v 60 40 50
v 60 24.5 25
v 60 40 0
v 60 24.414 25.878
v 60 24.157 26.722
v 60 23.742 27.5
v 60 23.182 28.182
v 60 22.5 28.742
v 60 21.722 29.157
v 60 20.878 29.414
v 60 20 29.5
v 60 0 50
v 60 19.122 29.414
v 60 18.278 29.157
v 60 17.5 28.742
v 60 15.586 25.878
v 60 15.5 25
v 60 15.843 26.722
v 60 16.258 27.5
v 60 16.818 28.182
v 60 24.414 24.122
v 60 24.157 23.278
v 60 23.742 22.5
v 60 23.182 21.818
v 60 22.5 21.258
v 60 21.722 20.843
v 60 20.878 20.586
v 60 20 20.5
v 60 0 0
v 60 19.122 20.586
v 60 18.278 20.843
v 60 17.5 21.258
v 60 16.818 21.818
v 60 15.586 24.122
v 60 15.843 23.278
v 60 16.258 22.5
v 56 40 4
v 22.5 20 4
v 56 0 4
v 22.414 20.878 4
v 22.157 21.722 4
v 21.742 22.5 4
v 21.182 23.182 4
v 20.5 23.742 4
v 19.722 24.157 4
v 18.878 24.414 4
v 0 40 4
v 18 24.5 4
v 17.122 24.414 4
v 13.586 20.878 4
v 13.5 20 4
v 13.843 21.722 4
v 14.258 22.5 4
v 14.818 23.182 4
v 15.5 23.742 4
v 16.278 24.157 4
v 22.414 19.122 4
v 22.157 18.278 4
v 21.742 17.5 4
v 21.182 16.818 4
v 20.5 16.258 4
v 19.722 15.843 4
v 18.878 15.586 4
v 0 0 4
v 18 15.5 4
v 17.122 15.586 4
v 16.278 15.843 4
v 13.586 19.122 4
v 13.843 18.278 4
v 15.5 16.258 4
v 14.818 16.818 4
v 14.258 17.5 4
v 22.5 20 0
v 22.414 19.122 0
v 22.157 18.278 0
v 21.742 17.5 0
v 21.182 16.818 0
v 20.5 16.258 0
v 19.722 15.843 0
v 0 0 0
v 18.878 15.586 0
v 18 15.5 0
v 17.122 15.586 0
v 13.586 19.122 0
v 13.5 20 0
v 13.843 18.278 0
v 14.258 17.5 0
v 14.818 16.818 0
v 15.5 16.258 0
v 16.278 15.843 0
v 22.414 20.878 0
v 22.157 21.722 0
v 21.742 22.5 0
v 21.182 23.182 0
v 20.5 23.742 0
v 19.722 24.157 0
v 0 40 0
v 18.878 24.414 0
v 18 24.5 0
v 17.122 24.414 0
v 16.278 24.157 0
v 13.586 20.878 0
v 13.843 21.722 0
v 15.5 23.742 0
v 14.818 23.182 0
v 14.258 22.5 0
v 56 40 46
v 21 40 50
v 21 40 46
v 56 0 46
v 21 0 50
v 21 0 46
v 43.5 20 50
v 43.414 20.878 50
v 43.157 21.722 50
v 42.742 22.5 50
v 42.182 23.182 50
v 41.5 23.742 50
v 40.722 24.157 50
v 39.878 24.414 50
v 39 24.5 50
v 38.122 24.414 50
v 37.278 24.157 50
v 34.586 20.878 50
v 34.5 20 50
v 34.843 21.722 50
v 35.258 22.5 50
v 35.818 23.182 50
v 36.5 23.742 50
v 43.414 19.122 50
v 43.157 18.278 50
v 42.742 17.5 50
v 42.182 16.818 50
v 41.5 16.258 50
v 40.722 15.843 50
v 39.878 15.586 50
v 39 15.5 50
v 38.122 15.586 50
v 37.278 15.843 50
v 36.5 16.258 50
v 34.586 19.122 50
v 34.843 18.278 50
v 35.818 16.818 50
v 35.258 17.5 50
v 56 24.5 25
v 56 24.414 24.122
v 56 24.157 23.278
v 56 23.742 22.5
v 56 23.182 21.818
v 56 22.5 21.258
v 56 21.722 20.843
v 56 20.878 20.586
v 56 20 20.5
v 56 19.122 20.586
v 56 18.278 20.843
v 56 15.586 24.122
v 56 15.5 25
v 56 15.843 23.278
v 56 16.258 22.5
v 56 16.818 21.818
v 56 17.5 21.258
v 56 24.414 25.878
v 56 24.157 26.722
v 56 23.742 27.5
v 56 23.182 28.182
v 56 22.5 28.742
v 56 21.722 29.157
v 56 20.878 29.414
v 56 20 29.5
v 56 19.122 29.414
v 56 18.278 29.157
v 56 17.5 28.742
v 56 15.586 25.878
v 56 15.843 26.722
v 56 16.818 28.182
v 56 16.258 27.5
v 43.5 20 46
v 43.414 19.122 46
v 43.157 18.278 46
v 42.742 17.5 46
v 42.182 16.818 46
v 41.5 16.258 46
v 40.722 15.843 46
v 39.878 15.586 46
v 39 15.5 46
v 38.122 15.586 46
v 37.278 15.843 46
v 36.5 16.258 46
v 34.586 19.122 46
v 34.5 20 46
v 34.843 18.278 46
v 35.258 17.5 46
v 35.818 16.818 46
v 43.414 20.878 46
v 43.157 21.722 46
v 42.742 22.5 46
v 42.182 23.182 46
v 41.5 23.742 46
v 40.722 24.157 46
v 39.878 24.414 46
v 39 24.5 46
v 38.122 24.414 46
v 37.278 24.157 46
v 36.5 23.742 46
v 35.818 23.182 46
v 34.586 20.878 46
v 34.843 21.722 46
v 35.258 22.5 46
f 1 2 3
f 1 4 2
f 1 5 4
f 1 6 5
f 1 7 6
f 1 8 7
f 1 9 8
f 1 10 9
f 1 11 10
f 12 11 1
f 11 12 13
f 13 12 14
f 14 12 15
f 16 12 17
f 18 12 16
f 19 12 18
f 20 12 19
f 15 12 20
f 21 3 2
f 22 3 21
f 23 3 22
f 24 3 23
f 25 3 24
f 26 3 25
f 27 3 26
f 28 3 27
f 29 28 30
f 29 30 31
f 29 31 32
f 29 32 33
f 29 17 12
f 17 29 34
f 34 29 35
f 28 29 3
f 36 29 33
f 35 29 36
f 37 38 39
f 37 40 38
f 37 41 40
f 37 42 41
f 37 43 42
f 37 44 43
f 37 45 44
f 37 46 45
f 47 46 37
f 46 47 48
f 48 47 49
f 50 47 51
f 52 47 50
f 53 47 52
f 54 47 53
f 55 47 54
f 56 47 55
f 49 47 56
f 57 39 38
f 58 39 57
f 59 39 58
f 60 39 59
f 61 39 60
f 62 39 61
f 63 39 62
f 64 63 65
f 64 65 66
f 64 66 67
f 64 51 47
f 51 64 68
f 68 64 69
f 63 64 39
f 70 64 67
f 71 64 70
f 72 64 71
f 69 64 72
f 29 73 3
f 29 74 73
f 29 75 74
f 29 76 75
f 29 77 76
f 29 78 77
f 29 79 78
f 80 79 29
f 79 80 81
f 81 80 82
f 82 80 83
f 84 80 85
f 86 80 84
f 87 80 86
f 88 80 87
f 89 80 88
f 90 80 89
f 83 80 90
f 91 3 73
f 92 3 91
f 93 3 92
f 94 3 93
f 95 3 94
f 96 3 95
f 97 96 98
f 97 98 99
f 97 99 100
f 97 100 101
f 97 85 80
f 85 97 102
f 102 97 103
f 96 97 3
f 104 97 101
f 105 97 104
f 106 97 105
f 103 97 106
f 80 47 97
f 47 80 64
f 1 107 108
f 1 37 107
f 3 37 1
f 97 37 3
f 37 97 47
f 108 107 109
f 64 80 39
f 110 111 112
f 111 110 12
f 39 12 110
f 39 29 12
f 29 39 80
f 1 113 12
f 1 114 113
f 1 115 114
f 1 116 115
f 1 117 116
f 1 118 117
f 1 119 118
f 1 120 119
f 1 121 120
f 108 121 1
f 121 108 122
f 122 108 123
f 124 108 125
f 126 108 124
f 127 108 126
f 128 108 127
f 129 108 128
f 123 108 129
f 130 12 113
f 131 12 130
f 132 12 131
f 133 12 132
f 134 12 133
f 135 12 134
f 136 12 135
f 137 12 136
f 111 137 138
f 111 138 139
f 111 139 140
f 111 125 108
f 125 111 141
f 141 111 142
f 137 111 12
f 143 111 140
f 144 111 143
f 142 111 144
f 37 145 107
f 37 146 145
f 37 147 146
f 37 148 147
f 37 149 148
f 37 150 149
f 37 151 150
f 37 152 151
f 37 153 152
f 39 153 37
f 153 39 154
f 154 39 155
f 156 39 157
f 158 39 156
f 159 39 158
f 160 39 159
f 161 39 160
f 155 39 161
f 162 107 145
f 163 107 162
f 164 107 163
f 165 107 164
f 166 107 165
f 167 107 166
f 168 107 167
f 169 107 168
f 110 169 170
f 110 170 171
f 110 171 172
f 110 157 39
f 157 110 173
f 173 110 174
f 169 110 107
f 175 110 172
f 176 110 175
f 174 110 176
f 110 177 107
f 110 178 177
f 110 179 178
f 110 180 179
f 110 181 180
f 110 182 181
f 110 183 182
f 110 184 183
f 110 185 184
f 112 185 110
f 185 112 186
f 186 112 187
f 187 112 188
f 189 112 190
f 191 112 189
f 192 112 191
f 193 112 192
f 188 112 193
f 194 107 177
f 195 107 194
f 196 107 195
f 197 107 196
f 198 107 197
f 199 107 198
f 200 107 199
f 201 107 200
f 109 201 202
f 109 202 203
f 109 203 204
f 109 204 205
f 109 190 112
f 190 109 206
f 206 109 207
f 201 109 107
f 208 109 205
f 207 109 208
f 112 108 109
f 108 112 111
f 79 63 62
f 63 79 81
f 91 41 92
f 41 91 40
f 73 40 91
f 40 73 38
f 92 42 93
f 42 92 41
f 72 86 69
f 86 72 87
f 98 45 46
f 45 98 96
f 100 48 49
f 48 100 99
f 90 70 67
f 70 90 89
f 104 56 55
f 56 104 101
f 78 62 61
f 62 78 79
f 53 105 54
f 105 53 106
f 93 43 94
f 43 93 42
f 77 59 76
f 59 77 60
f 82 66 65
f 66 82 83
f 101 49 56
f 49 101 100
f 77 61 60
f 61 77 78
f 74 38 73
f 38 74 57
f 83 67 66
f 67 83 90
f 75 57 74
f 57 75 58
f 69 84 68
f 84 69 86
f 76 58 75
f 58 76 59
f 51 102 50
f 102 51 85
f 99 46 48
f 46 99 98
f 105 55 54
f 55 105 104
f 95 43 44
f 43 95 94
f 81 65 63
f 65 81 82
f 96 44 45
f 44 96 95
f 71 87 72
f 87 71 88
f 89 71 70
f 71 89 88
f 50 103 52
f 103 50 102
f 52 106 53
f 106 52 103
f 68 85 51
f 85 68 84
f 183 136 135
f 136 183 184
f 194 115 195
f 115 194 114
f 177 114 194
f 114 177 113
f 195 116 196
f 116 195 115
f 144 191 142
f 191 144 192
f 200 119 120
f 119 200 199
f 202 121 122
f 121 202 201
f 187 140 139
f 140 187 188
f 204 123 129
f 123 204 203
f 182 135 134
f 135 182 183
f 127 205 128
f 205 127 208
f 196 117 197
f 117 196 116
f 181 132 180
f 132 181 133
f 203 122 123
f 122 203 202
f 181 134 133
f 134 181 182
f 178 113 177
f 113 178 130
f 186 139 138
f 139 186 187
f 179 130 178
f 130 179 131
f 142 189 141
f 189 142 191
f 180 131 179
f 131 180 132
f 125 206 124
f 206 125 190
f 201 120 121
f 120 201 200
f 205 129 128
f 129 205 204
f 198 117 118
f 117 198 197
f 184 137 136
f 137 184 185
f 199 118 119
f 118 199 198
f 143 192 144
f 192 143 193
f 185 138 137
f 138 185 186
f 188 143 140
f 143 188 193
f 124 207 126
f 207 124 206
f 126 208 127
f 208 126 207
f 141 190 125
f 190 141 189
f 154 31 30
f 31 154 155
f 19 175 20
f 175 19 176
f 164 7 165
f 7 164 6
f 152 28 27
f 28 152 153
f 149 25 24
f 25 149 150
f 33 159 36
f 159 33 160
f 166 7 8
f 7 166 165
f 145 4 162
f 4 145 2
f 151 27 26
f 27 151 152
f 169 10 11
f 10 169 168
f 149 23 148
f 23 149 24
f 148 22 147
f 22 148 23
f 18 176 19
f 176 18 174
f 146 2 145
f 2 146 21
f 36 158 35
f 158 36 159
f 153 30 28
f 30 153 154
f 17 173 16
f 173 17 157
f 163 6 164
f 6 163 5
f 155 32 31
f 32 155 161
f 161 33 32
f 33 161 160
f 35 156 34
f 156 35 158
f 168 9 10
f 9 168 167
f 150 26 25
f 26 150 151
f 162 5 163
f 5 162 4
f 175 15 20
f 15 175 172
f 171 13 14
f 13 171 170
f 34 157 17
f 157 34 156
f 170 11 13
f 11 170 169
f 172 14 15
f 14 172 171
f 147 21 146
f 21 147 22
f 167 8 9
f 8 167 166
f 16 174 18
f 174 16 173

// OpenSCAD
$fn = 32;

// ----------------------------------------------------------------------
// Z-bracket: 60 x 40 x 50 mm
// ----------------------------------------------------------------------

// --- parameters (mm) ---
foot_len = 60;            // lower foot length, X
top_len = 35;             // upper foot length, X
depth = 40;               // bracket width, Y
step_h = 50;              // overall rise, Z
plate_t = 4;              // plate thickness
hole_d = 9;               // clearance for M8

module hole_z(px, py, z0) {
  translate([px, py, z0 - 2.5]) cylinder(h = plate_t + 5, d = hole_d);
}
module hole_x(py, pz) {
  translate([-2.5, py, pz]) rotate([0, 90, 0]) cylinder(h = plate_t + 5, d = hole_d);
}

difference() {
  union() {
    cube([foot_len, depth, plate_t]);
    /* web, overlapping the lower foot */
    translate([foot_len - plate_t, 0, 0]) cube([plate_t, depth, step_h]);
    /* upper foot, sunk into the web */
    translate([foot_len - plate_t - top_len, 0, step_h - plate_t]) cube([top_len + plate_t, depth, plate_t]);
  }
  hole_z(18, 20, 0);
  translate([foot_len - plate_t - 17, 0, 0]) hole_z(0, 20, step_h - plate_t);
  translate([foot_len - plate_t, 0, 0]) hole_x(20, 25);
}
